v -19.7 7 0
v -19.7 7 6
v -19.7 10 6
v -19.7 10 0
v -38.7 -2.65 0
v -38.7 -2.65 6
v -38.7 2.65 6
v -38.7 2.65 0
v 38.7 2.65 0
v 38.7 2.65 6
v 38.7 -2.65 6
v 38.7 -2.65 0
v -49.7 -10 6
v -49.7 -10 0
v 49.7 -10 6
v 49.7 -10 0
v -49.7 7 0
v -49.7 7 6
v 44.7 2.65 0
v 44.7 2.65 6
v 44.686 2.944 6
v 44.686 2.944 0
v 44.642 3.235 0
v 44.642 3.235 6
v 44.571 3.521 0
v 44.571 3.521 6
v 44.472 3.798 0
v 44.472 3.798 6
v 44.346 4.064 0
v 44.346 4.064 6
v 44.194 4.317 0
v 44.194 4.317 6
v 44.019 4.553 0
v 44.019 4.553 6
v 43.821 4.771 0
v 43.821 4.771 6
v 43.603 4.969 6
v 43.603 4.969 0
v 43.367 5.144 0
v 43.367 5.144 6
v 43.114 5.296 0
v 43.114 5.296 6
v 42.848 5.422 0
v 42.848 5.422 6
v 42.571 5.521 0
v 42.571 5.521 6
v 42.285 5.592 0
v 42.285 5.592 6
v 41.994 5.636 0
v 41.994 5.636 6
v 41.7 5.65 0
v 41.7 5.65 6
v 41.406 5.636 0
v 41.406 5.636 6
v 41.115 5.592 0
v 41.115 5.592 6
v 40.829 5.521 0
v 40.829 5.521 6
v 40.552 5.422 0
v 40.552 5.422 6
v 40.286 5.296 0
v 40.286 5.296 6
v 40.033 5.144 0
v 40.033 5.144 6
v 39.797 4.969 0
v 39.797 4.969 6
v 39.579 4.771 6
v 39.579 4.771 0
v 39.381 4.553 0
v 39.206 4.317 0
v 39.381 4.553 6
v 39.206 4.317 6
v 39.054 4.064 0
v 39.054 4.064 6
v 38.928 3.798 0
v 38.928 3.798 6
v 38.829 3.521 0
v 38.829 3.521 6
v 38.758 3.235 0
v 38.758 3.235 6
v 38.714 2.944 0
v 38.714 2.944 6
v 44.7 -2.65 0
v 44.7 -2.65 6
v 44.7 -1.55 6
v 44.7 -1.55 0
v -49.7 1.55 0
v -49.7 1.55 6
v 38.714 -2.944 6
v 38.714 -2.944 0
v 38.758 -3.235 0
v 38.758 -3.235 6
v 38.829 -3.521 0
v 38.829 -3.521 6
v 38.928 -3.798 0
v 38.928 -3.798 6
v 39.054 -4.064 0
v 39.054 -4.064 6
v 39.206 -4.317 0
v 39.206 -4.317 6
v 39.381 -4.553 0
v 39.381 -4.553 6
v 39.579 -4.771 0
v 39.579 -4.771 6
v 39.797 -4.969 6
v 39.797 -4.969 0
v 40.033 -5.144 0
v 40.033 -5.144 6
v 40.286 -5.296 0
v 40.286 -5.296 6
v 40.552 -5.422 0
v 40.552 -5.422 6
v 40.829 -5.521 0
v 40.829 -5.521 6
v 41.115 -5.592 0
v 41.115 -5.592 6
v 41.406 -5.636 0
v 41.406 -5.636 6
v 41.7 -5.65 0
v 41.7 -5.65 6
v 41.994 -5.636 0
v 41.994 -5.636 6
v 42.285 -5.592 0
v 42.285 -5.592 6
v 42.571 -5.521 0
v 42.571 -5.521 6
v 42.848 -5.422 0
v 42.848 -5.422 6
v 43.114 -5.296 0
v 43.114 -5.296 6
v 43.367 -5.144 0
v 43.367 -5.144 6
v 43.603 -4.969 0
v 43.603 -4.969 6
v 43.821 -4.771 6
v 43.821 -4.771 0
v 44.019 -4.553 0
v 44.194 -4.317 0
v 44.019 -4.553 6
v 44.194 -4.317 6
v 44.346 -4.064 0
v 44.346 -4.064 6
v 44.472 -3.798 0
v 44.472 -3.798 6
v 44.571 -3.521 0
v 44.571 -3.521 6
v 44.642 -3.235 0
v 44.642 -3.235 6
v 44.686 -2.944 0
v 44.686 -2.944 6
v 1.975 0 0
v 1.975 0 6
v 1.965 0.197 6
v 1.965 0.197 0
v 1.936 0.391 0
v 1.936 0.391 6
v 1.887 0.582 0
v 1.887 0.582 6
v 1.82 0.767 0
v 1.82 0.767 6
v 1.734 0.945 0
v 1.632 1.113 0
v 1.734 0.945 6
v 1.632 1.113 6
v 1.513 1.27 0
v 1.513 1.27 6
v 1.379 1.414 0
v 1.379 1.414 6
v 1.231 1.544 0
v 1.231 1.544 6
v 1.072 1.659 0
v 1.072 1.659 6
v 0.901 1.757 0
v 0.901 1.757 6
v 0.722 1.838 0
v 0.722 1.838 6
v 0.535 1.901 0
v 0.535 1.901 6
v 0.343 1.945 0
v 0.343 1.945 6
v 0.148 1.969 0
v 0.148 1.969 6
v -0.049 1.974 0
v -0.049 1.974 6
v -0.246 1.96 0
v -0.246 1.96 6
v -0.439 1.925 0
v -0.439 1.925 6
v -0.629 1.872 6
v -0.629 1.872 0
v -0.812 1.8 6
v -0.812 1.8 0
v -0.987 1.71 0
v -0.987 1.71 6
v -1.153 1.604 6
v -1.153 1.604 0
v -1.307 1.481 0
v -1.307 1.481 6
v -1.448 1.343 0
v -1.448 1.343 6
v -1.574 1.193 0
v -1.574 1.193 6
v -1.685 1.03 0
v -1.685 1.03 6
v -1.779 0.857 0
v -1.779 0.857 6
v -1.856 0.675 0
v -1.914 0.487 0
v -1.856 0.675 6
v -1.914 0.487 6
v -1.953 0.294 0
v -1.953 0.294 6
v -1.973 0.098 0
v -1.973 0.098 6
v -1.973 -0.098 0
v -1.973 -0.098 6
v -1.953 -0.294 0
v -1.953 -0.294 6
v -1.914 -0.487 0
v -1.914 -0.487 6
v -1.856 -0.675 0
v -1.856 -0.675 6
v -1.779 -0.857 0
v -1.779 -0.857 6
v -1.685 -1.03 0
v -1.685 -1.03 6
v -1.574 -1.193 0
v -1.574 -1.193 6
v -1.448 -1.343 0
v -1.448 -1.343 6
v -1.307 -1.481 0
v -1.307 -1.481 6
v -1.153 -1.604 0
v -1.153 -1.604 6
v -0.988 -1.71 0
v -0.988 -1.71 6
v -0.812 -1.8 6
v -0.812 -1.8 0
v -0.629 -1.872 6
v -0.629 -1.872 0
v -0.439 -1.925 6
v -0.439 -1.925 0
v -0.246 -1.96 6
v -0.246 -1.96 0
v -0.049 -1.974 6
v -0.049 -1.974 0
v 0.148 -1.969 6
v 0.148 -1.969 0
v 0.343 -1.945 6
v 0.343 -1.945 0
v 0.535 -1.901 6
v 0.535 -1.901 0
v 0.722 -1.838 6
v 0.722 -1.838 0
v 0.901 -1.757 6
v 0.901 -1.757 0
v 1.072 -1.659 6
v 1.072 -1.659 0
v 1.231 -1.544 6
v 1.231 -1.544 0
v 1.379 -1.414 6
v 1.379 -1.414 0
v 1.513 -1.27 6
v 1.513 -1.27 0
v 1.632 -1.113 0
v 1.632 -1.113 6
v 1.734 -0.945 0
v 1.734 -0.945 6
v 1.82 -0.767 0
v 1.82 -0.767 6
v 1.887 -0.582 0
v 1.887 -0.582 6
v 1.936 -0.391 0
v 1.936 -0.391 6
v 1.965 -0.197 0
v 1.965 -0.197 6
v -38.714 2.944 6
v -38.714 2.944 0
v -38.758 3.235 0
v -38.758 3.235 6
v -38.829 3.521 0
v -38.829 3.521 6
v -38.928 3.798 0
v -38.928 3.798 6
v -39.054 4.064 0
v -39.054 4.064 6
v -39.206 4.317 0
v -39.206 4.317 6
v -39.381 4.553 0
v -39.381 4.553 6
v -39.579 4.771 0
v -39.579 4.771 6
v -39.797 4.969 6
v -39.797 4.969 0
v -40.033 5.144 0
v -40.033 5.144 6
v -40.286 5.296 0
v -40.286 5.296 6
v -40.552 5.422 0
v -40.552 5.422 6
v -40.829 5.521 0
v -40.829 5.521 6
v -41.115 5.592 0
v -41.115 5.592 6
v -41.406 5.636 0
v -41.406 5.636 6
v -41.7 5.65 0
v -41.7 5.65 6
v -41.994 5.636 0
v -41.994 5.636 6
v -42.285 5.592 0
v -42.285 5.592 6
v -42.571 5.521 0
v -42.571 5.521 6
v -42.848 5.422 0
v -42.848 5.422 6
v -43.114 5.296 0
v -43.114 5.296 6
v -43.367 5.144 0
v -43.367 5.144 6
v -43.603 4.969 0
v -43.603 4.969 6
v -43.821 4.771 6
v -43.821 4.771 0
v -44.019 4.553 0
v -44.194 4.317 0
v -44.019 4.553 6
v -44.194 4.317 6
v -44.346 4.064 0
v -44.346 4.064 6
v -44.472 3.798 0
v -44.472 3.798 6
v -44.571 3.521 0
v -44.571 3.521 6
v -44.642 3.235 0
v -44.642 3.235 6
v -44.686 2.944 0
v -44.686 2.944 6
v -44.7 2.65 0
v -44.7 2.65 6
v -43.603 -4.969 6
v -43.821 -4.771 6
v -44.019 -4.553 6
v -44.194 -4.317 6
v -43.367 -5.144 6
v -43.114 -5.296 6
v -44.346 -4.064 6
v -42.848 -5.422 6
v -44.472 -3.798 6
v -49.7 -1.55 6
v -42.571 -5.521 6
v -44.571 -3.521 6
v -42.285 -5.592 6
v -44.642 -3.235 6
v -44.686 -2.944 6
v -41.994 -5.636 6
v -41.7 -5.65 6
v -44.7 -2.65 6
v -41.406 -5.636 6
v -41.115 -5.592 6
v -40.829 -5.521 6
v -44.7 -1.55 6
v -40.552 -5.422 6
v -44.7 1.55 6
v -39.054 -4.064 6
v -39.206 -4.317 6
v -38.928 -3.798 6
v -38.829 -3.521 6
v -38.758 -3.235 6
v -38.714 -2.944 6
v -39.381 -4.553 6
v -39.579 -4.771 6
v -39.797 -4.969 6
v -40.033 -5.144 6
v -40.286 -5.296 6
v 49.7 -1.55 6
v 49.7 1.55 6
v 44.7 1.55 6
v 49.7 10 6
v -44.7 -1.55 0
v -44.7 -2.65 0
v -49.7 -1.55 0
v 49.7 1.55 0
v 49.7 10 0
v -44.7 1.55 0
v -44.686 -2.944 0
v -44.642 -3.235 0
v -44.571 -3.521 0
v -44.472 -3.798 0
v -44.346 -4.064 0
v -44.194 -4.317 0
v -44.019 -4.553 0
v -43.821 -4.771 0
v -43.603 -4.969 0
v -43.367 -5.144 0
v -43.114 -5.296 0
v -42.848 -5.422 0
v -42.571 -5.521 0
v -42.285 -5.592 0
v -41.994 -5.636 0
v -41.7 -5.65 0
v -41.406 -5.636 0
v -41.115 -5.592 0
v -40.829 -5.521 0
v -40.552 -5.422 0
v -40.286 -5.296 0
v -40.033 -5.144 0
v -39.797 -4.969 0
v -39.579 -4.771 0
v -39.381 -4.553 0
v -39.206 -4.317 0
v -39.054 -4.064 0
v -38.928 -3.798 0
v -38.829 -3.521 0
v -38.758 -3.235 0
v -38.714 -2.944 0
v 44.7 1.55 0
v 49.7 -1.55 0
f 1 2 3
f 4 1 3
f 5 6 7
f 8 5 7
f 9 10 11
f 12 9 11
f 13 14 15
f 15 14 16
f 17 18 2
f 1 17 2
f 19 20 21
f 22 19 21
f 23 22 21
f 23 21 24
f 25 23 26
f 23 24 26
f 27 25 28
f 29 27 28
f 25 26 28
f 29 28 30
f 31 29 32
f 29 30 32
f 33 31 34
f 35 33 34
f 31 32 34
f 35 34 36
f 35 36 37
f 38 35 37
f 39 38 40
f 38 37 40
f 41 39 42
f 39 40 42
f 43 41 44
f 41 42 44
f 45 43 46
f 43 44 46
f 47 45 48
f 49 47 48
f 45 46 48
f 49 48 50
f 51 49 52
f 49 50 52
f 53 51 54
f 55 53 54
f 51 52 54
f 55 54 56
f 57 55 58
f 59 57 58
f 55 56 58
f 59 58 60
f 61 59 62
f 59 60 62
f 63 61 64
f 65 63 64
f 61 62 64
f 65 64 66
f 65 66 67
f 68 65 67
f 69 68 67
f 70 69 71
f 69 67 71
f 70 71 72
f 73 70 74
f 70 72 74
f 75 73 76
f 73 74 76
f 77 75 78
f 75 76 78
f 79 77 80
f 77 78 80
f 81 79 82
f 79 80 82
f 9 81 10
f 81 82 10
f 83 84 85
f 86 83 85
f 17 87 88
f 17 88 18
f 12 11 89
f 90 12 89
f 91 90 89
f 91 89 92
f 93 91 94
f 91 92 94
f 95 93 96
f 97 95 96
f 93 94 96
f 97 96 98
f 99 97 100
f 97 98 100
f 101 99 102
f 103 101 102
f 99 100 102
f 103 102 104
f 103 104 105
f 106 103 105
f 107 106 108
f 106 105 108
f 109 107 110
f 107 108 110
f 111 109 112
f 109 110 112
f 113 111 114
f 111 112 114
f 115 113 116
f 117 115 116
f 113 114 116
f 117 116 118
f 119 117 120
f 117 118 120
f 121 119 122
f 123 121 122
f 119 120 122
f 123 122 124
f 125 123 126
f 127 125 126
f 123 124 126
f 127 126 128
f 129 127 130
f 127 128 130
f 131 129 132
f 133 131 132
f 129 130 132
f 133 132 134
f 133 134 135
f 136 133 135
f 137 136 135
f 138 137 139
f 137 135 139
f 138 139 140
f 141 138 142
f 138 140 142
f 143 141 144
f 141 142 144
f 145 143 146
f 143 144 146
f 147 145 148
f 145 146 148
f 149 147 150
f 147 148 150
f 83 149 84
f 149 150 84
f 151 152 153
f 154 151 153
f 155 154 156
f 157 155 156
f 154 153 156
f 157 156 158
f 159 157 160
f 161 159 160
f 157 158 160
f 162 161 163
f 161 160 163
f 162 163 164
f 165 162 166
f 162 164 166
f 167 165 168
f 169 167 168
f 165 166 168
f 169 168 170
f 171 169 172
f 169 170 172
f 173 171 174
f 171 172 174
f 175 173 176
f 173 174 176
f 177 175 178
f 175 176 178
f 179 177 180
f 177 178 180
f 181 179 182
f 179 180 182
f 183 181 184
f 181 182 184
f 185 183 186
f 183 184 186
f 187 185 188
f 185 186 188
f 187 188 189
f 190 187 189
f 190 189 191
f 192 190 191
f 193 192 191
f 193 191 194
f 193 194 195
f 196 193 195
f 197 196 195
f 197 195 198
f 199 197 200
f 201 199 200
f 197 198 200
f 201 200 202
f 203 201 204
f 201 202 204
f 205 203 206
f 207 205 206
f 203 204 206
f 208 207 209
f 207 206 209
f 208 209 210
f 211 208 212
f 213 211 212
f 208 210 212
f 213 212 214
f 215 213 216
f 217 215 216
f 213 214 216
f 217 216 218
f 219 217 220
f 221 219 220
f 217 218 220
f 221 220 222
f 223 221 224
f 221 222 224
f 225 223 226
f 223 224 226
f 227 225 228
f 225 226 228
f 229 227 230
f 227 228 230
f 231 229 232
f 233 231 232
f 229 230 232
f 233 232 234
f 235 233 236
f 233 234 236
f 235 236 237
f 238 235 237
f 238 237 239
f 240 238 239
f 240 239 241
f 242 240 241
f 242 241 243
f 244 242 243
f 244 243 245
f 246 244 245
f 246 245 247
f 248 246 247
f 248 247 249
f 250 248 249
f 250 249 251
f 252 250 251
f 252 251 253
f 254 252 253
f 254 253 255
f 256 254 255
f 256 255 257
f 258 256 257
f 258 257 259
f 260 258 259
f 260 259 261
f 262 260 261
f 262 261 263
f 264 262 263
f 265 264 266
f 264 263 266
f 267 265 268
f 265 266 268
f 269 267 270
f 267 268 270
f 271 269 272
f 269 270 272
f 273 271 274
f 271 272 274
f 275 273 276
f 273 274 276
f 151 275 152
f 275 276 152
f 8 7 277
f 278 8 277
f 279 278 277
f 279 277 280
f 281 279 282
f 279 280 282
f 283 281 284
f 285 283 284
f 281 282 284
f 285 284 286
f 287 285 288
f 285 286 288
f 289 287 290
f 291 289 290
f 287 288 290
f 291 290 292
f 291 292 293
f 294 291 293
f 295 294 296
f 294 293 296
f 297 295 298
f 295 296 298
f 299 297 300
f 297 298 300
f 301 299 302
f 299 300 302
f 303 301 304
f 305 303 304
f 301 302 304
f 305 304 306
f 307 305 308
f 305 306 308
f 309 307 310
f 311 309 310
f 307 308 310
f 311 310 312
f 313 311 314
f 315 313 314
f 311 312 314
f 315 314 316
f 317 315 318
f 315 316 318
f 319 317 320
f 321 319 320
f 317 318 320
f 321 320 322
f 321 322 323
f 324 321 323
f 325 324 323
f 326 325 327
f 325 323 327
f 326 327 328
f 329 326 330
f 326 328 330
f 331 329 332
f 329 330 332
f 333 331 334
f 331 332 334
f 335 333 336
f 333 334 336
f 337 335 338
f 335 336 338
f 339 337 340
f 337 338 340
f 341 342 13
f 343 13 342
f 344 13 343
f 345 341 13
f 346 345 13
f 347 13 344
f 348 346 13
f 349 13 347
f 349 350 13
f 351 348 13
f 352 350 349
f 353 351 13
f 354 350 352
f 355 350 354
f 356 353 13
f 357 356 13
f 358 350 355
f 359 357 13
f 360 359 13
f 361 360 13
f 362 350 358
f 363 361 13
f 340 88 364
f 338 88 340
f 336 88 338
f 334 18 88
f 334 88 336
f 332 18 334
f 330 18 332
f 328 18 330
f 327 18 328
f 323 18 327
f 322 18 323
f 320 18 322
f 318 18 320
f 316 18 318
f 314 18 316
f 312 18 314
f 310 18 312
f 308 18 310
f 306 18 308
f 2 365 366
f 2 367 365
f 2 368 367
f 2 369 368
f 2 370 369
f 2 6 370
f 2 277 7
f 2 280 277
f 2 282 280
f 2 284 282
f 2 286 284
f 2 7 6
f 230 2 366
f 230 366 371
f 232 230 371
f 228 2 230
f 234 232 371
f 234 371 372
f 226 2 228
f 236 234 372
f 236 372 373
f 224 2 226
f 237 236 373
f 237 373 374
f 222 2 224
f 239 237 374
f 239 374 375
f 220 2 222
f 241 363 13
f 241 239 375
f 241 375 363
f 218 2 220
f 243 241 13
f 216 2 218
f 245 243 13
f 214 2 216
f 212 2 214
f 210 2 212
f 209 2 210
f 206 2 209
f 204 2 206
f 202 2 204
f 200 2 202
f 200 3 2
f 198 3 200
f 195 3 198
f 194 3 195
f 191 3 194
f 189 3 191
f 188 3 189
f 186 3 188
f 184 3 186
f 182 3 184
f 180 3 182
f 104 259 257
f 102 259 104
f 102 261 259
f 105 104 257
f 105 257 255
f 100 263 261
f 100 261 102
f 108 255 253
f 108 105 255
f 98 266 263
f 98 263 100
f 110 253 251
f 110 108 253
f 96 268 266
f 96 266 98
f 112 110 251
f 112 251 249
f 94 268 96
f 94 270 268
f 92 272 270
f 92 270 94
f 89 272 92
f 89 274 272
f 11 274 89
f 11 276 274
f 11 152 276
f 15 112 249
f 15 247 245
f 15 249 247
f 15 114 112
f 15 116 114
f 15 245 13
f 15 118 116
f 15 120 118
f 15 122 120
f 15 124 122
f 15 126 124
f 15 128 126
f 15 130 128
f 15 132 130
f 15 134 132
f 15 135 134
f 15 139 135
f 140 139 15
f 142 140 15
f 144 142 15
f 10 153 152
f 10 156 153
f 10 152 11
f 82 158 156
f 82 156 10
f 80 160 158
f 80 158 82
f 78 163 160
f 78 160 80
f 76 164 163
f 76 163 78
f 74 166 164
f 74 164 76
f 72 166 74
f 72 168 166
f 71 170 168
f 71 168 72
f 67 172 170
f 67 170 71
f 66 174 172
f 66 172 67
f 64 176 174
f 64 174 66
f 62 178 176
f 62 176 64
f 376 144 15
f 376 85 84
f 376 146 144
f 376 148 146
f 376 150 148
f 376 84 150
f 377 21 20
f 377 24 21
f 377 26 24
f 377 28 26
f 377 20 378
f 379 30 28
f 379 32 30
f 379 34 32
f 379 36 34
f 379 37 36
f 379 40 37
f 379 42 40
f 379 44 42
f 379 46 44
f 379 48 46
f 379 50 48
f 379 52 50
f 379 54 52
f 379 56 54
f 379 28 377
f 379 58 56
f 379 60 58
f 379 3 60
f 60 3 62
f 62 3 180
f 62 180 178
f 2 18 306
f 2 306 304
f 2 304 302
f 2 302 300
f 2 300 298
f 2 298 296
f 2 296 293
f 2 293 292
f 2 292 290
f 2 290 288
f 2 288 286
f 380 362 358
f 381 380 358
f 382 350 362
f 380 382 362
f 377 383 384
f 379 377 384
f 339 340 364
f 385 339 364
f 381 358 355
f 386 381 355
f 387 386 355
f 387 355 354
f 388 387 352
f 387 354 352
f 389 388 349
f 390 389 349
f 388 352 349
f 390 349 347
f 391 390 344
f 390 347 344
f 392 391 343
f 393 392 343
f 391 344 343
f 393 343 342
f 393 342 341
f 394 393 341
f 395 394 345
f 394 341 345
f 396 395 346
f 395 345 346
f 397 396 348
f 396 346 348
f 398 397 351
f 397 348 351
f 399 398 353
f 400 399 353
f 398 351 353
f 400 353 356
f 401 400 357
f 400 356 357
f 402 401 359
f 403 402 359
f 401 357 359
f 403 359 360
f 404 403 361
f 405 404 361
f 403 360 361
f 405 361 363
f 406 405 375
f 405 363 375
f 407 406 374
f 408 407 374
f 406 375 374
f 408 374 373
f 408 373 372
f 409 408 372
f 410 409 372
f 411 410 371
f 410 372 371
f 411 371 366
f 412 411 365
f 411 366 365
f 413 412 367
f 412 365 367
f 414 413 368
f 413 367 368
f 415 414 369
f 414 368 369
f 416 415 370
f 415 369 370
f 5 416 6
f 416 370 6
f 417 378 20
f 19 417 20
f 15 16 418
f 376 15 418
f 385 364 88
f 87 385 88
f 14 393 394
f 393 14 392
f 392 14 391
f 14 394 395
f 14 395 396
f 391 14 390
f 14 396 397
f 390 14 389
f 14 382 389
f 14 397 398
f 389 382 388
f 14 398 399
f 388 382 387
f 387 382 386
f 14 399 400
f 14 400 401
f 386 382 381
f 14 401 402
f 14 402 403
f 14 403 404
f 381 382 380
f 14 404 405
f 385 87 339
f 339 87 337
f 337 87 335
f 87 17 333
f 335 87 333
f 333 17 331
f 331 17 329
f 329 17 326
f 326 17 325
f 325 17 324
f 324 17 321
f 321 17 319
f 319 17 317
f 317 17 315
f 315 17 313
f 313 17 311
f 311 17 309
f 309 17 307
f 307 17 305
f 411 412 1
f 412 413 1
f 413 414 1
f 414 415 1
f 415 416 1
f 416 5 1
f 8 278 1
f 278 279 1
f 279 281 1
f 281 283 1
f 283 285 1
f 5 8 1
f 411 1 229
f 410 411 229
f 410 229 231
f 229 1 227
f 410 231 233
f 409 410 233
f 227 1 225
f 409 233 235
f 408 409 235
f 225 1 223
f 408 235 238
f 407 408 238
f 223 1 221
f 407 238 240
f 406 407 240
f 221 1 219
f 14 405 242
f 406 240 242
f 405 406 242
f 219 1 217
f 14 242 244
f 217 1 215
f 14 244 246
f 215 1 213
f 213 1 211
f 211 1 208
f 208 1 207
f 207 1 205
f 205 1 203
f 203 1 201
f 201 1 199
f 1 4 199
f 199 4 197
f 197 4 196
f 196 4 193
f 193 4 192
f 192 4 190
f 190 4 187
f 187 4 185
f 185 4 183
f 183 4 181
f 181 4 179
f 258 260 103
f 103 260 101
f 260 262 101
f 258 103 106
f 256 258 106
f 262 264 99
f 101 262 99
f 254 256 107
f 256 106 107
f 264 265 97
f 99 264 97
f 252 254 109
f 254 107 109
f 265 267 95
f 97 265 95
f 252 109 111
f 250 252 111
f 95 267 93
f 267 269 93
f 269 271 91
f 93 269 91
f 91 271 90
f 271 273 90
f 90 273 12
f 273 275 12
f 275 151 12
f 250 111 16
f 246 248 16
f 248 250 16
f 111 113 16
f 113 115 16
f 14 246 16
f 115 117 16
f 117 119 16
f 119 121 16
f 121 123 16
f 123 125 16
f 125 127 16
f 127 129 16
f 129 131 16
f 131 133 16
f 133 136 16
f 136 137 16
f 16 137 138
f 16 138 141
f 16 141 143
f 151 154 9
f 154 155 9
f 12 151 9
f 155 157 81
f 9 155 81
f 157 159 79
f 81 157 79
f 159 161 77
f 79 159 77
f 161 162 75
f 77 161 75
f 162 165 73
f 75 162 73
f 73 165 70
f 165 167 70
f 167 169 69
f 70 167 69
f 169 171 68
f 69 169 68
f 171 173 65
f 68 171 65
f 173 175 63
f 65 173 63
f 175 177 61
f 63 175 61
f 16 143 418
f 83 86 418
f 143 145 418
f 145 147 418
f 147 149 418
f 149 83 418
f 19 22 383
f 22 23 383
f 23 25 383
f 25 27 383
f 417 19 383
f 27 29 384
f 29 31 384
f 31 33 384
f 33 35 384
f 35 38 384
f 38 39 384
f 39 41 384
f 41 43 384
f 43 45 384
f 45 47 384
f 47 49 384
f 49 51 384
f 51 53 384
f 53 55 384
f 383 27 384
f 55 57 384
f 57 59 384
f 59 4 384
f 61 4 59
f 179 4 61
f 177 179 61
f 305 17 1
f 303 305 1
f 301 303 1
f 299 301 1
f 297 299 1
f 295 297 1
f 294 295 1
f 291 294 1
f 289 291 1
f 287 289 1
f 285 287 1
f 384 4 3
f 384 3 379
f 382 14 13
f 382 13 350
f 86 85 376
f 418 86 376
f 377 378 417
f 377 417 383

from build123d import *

# Parameters (mm, degrees)
F0_W     = 99.4
F0_H     = 20
F1_DEPTH = 6
F2_W     = 5
F2_H     = 3.1
F2_W_2   = 6
F3_DEPTH = 6
F4_R     = 1.975
F5_DEPTH = 6
F6_W     = 30
F6_H     = 3
F7_DEPTH = 6


with BuildPart() as f1:
    # F0 (on Top) → F1 (new body)
    with BuildSketch(Plane.XY):
        Rectangle(F0_W, F0_H)
    extrude(amount=F1_DEPTH)

    # F2 (on face) → F3 (cut, through all)
    with BuildSketch(Plane.XY.offset(6)):
        with Locations((-47.2, 0)):
            Rectangle(F2_W, F2_H)
        with Locations((-41.7, 0)):
            Rectangle(F2_W_2, F2_H)
        with BuildLine():
            Line((-38.7, -1.55), (-44.7, -1.55))
            Line((-44.7, -1.55), (-44.7, -2.65))
            ThreePointArc((-44.7, -2.65), (-41.7, -5.65), (-38.7, -2.65))
            Line((-38.7, -2.65), (-38.7, -1.55))
        make_face()
        with BuildLine():
            Line((-44.7, 2.65), (-44.7, 1.55))
            Line((-44.7, 1.55), (-38.7, 1.55))
            Line((-38.7, 1.55), (-38.7, 2.65))
            ThreePointArc((-38.7, 2.65), (-41.7, 5.65), (-44.7, 2.65))
        make_face()
        with Locations((41.7, 0)):
            Rectangle(F2_W_2, F2_H)
        with BuildLine():
            Line((38.7, 2.65), (38.7, 1.55))
            Line((38.7, 1.55), (44.7, 1.55))
            Line((44.7, 1.55), (44.7, 2.65))
            ThreePointArc((44.7, 2.65), (41.7, 5.65), (38.7, 2.65))
        make_face()
        with BuildLine():
            Line((44.7, -1.55), (38.7, -1.55))
            Line((38.7, -1.55), (38.7, -2.65))
            ThreePointArc((38.7, -2.65), (41.7, -5.65), (44.7, -2.65))
            Line((44.7, -2.65), (44.7, -1.55))
        make_face()
        with Locations((47.2, 0)):
            Rectangle(F2_W, F2_H)
    extrude(amount=-F3_DEPTH, mode=Mode.SUBTRACT)

    # F4 (on face) → F5 (cut, through all)
    with BuildSketch(Plane.XY.offset(6)):
        Circle(F4_R)
    extrude(amount=-F5_DEPTH, mode=Mode.SUBTRACT)

    # F6 (on face) → F7 (cut, through all)
    with BuildSketch(Plane.XY.offset(6)):
        with Locations((-34.7, 8.5)):
            Rectangle(F6_W, F6_H)
    extrude(amount=-F7_DEPTH, mode=Mode.SUBTRACT)


solid = f1.part
